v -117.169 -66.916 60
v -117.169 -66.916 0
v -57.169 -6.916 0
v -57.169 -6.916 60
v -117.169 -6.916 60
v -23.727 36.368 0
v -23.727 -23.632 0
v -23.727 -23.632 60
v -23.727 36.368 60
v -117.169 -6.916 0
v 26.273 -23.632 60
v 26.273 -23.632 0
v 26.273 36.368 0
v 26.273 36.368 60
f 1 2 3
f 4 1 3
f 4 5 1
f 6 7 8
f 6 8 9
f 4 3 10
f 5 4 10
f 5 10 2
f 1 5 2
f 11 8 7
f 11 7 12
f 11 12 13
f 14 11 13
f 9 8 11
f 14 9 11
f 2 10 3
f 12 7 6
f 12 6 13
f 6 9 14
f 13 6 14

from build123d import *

# Parameters (mm, degrees)
F0_W     = 50
F0_H     = 60
F1_DEPTH = 60
F3_DEPTH = 60


with BuildPart() as f1:
    # F0 (on Top) → F1 (new body)
    with BuildSketch(Plane.XY):
        with Locations((1.273109, 6.367529)):
            Rectangle(F0_W, F0_H)
    extrude(amount=F1_DEPTH)


with BuildPart() as f3:
    # F2 (on Top) → F3 (new body)
    with BuildSketch(Plane.XY):
        Polygon((-57.168607, -6.91614), (-117.168607, -6.91614), (-117.168607, -66.91614), align=None)
    extrude(amount=F3_DEPTH)


solid = Compound([f1.part, f3.part])
